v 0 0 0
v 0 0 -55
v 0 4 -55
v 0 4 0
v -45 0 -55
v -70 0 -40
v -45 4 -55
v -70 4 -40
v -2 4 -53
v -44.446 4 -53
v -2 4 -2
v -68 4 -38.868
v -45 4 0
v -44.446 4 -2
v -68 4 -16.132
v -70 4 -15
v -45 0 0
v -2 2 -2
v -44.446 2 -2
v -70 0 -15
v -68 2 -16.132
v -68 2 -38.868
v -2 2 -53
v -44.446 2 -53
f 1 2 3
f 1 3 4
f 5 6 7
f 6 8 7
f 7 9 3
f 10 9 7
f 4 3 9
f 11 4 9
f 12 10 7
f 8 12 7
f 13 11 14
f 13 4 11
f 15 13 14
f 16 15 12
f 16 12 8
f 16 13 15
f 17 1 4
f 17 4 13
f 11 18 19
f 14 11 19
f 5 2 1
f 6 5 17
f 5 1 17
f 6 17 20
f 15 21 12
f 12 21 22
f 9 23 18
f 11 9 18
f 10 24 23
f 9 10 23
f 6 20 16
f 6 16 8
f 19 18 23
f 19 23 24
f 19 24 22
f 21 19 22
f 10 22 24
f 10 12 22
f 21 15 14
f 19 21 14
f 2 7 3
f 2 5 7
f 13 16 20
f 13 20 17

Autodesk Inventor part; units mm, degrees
ref_plane "YZ Plane" through (0, 0, 0) normal (1, 0, 0) x (0, 1, 0)
ref_plane "XZ Plane" through (0, 0, 0) normal (0, 1, 0) x (-1, 0, 0)
ref_plane "XY Plane" through (0, 0, 0) normal (0, 0, 1) x (1, 0, 0)
sketch "Sketch1" plane through (0, 0, 0) normal (0, 1, 0) x (-1, 0, 0)
  line L0 (0, 0) -> (70, 0)
  line L1 (70, 0) -> (70, -55)
  line L2 (70, -55) -> (0, -55)
  line L3 (0, -55) -> (0, 0)
  dimension "d0" = 70
  dimension "d1" = 55
extrude "Extrusion1" add sketch "Sketch1" along normal blind 4
sketch "Sketch9" plane through (0, 4, 0) normal (0, 1, 0) x (1, 0, 0)
  line L0 (-70, 0) -> (0, 0) projected
  line L1 (-70, 55) -> (-70, 0) projected
  line L2 (-45, 0) -> (-70, 0)
  line L3 (-70, 0) -> (-70, 15)
  line L4 (-70, 15) -> (-45, 0)
  line L5 (0, 55) -> (-70, 55) projected
  line L6 (-45, 55) -> (-70, 55)
  line L7 (-70, 55) -> (-70, 40)
  line L8 (-70, 40) -> (-45, 55)
  dimension "d11" = 15
  dimension "d12" = 15
  dimension "d37" = 25
  dimension "d38" = 25
extrude "Extrusion4" cut sketch "Sketch9" against normal blind 4
shell "Shell1" thickness 2 removed faces 1 at (-15, 4, -18.3333)
properties part number "Foot"
